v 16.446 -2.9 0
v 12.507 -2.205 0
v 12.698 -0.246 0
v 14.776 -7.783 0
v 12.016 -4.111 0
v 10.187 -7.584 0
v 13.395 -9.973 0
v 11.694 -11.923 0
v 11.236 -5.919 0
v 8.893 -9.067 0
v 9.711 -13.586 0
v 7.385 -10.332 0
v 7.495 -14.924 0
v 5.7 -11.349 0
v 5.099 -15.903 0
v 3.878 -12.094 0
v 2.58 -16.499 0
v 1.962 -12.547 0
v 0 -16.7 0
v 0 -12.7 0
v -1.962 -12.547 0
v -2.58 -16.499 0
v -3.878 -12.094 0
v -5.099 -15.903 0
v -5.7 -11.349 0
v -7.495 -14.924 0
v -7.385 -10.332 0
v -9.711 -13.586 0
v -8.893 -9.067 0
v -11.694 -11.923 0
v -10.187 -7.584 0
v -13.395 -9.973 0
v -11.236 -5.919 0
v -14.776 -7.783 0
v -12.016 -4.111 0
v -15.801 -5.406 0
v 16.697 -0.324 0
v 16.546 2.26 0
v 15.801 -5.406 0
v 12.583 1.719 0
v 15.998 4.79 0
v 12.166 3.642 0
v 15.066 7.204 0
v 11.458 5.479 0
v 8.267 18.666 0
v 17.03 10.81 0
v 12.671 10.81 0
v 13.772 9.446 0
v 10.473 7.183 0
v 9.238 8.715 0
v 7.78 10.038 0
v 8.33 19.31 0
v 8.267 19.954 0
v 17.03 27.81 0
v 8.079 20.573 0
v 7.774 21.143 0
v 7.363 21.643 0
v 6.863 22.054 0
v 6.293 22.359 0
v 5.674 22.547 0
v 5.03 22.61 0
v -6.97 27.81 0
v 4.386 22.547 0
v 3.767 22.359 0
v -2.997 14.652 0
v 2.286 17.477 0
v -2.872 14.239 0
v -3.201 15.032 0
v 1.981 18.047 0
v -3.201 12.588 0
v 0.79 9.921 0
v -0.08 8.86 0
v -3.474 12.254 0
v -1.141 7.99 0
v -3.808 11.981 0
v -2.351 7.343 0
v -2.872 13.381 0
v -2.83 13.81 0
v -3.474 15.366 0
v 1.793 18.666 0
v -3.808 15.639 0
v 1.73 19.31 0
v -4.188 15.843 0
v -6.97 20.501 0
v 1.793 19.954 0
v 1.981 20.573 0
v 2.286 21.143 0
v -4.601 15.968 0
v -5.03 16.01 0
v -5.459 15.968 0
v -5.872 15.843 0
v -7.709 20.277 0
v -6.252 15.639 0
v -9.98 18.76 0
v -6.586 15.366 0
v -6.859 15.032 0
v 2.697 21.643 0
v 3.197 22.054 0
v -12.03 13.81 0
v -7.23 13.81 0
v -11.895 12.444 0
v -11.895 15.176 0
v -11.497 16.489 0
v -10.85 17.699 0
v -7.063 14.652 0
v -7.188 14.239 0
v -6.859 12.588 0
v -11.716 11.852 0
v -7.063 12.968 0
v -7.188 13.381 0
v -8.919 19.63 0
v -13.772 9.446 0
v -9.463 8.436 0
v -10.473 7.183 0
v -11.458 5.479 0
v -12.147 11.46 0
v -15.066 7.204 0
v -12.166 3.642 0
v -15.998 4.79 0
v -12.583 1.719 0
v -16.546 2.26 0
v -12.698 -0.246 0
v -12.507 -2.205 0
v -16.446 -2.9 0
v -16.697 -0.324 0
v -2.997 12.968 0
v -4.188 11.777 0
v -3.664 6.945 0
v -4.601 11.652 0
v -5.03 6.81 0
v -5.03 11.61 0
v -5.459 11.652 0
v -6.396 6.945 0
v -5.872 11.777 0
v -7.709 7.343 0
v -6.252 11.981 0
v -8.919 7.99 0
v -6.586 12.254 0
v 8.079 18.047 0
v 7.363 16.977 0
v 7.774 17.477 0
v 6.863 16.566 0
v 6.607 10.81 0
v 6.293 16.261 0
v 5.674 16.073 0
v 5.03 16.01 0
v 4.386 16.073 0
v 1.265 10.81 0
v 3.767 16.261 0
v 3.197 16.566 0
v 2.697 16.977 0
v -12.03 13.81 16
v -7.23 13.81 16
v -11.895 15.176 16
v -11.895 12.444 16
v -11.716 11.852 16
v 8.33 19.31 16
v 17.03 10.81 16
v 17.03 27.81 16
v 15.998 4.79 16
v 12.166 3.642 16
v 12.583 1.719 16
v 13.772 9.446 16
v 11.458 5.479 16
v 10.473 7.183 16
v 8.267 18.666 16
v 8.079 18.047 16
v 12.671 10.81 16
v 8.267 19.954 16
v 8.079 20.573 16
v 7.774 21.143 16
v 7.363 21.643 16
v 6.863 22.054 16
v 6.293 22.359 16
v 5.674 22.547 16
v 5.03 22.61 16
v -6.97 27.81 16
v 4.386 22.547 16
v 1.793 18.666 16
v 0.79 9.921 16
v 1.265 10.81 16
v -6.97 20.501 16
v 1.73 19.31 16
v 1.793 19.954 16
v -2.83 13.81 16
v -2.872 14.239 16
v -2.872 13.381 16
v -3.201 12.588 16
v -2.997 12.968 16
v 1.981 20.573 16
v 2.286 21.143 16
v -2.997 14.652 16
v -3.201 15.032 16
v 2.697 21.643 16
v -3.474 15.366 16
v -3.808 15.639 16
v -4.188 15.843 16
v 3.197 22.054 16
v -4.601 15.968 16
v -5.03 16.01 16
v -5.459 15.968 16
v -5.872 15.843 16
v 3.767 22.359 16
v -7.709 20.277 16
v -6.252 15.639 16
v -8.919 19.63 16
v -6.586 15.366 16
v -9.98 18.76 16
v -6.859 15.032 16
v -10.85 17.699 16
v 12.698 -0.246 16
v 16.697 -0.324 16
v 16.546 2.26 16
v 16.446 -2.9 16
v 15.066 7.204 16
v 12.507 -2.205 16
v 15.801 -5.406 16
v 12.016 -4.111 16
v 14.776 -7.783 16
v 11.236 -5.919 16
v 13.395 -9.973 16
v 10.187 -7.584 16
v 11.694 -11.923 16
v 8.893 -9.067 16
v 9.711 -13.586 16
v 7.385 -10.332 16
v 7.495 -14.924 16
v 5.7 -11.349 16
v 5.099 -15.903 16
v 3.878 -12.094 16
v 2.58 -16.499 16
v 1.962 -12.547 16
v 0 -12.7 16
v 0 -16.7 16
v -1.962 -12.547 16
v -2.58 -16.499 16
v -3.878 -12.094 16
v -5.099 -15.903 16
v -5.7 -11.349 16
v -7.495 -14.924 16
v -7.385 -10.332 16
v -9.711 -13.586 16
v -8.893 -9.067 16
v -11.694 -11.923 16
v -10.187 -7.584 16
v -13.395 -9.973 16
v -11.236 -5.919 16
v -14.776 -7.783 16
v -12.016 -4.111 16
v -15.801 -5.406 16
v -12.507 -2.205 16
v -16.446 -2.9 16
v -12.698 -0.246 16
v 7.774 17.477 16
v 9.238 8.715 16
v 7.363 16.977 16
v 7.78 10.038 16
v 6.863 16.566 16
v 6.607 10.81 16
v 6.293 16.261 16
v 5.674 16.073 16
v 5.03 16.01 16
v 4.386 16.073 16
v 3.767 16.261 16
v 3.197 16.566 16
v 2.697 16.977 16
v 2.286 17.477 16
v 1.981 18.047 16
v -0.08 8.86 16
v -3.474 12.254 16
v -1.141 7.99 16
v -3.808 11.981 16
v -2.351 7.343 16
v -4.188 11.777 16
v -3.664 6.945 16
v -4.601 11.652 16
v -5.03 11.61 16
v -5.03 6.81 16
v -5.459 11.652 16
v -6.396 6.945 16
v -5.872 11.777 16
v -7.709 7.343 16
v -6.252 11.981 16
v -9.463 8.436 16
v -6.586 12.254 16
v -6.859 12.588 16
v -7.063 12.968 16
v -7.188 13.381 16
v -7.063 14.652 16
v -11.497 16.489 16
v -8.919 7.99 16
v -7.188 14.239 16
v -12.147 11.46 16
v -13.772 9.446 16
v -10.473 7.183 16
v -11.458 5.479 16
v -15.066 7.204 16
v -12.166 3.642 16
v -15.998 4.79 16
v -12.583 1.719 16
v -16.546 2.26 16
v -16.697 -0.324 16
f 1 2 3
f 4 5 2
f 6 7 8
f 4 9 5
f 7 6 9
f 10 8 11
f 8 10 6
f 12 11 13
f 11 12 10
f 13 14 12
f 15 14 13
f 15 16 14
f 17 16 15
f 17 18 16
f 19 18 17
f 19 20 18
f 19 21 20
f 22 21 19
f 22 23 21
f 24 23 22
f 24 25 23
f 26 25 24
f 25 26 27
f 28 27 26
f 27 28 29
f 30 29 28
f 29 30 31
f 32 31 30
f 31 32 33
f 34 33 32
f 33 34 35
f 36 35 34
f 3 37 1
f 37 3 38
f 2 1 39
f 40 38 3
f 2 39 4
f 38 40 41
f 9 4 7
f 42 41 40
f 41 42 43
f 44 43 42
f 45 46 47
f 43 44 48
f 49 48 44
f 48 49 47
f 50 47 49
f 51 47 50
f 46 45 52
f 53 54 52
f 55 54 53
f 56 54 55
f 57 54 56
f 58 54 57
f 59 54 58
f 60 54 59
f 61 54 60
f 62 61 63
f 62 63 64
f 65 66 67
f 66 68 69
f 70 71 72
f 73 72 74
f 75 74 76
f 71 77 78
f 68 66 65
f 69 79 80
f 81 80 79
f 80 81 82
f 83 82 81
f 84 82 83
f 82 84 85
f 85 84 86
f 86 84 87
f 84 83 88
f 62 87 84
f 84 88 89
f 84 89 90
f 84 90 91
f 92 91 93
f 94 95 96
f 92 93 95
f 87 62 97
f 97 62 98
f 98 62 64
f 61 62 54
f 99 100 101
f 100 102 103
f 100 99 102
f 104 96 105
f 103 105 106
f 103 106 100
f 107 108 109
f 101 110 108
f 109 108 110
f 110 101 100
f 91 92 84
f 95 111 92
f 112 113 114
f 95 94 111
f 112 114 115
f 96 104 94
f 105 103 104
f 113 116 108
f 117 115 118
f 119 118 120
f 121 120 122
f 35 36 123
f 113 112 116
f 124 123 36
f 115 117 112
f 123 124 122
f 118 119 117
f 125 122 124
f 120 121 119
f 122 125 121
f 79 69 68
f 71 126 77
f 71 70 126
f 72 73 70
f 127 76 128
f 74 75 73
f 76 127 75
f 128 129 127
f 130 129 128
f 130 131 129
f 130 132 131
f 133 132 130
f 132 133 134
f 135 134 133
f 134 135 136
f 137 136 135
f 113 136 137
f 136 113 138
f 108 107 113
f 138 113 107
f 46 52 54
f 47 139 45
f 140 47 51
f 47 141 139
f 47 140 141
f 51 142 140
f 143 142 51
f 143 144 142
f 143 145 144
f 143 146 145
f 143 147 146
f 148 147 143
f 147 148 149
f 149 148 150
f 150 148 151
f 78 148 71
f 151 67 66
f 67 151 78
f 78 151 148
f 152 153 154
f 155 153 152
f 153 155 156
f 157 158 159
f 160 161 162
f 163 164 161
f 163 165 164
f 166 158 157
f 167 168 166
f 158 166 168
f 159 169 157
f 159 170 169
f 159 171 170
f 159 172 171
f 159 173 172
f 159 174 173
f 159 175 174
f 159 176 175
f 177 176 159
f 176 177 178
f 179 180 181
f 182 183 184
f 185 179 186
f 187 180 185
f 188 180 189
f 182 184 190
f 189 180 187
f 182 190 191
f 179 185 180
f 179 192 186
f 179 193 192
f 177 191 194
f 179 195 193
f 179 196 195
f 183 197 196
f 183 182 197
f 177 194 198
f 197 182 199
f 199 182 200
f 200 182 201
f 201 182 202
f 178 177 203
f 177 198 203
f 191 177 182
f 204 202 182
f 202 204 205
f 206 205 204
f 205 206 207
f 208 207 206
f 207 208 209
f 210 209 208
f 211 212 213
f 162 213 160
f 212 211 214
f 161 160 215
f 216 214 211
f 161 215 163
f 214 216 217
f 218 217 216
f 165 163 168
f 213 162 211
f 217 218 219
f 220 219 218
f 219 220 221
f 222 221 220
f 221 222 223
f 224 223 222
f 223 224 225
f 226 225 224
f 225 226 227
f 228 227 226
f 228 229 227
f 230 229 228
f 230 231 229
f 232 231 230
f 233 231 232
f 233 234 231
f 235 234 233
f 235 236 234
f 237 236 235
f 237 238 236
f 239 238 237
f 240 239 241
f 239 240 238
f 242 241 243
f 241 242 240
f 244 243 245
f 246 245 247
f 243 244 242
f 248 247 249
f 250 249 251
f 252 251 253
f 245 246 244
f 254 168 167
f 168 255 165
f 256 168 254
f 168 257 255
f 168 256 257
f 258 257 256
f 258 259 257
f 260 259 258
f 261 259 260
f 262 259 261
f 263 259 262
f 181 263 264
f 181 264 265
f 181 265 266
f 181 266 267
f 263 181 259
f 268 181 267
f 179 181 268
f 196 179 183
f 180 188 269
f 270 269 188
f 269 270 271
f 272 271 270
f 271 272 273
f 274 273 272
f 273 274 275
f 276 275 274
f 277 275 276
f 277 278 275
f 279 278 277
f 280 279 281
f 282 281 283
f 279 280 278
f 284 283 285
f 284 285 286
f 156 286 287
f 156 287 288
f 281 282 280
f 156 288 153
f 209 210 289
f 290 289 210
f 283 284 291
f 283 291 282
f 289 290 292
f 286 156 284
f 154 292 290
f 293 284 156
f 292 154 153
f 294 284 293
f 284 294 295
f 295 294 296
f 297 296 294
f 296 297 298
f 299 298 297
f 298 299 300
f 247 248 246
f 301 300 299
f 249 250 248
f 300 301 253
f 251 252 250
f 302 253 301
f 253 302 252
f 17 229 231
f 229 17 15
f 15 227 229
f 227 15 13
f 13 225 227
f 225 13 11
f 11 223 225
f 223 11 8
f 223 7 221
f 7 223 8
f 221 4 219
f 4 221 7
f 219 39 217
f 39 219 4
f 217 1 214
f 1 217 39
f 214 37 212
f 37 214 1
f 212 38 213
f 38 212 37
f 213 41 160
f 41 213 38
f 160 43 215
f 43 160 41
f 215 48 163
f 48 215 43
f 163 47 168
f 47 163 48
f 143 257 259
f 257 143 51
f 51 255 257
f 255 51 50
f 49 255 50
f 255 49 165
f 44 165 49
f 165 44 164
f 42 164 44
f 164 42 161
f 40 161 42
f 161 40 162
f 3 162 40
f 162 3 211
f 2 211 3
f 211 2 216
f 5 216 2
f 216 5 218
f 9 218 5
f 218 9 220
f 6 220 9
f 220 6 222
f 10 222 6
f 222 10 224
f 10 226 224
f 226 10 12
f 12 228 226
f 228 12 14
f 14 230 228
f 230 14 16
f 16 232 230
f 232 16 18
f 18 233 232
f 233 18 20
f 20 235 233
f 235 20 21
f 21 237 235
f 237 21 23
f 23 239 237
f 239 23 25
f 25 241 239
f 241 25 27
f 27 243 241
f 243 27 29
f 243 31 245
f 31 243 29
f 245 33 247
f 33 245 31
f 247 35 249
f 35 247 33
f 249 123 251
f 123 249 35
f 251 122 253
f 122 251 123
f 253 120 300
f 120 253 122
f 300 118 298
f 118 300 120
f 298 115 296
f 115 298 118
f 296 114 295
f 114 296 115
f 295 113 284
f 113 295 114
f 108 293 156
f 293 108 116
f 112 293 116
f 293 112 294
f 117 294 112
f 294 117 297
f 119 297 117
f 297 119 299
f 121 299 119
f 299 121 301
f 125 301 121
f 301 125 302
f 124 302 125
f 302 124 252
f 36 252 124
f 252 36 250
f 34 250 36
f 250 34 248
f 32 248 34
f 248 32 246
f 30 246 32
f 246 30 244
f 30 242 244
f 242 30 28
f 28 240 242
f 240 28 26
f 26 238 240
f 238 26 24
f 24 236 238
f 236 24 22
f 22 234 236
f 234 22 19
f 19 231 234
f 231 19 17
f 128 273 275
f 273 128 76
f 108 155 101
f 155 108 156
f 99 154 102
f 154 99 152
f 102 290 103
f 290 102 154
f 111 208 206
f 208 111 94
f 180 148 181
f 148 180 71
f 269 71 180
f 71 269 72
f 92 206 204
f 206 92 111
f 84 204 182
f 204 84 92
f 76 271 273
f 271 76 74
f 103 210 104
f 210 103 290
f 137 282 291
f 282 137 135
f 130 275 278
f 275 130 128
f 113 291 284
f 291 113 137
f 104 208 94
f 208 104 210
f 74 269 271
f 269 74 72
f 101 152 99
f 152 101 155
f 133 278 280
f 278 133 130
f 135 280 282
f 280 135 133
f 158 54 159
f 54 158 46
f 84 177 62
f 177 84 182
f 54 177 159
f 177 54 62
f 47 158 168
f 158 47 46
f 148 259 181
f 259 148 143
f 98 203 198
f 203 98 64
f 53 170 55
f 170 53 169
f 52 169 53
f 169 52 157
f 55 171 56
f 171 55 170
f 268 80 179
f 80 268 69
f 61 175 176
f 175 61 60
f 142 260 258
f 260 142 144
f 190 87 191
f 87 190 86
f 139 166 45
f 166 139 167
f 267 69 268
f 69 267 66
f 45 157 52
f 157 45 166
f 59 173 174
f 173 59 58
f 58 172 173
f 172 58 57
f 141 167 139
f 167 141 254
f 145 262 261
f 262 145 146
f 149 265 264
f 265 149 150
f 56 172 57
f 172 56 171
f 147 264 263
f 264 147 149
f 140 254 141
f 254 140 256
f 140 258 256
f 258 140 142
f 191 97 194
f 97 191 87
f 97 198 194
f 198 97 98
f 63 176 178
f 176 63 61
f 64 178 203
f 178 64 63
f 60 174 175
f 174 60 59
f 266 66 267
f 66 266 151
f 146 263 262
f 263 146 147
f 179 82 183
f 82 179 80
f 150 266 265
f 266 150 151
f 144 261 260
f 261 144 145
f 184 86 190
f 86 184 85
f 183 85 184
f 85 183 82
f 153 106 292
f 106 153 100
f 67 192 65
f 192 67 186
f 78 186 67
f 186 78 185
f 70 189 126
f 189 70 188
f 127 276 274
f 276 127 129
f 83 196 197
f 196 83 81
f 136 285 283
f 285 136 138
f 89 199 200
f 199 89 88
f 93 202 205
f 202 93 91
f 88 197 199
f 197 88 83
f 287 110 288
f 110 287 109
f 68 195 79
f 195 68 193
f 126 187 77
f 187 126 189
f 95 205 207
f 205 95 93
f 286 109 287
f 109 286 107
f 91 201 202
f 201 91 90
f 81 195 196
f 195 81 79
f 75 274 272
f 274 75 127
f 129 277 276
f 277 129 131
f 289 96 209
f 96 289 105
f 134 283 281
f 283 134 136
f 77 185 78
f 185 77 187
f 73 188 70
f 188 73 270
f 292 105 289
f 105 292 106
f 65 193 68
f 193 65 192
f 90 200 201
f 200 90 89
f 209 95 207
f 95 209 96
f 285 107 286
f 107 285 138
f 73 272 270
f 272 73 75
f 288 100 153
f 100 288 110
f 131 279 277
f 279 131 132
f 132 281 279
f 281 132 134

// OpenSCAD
$fn = 32;

// ----------------------------------------------------------------------
// Pipe clamp: 33.4 mm ring, 4 mm wall, 16 mm wide
// ----------------------------------------------------------------------

// --- parameters (mm) ---
outer_r = 16.7;           // clamp outside radius
inner_r = 12.7;           // pipe bore radius
band = 4;                 // band thickness
clamp_w = 16;             // clamp width
opening = 40;             // opening angle between the ends
lug_w = 24;               // lug width
lug_len = 17;             // lug length
bolt_d = 6.6;             // bolt hole
knuckle_d = 14;           // hinge knuckle diameter
pin_d = 4.4;              // hinge pin hole

clamp_profile = [[-5.712, 15.693], [-8.068, 14.622], [-10.23, 13.2], [-12.147, 11.46], [-13.772, 9.446], [-15.066, 7.204], [-15.998, 4.79], [-16.546, 2.26], [-16.697, -0.324], [-16.446, -2.9], [-15.801, -5.406], [-14.776, -7.783], [-13.395, -9.973], [-11.694, -11.923], [-9.711, -13.586], [-7.495, -14.924], [-5.099, -15.903], [-2.58, -16.499], [0, -16.7], [2.58, -16.499], [5.099, -15.903], [7.495, -14.924], [9.711, -13.586], [11.694, -11.923], [13.395, -9.973], [14.776, -7.783], [15.801, -5.406], [16.446, -2.9], [16.697, -0.324], [16.546, 2.26], [15.998, 4.79], [15.066, 7.204], [13.772, 9.446], [12.147, 11.46], [10.23, 13.2], [8.068, 14.622], [5.712, 15.693], [4.344, 11.934], [6.136, 11.12], [7.78, 10.038], [9.238, 8.715], [10.473, 7.183], [11.458, 5.479], [12.166, 3.642], [12.583, 1.719], [12.698, -0.246], [12.507, -2.205], [12.016, -4.111], [11.236, -5.919], [10.187, -7.584], [8.893, -9.067], [7.385, -10.332], [5.7, -11.349], [3.878, -12.094], [1.962, -12.547], [0, -12.7], [-1.962, -12.547], [-3.878, -12.094], [-5.7, -11.349], [-7.385, -10.332], [-8.893, -9.067], [-10.187, -7.584], [-11.236, -5.919], [-12.016, -4.111], [-12.507, -2.205], [-12.698, -0.246], [-12.583, 1.719], [-12.166, 3.642], [-11.458, 5.479], [-10.473, 7.183], [-9.238, 8.715], [-7.78, 10.038], [-6.136, 11.12], [-4.344, 11.934]];

difference() {
  union() {
    linear_extrude(height = clamp_w) polygon(clamp_profile);
    /* hinge knuckle, sunk 2 mm into the band end */
    translate([-5.03, 13.81, 0]) cylinder(h = clamp_w, d = knuckle_d);
    /* bolt lug on the other end */
    translate([-6.97, 10.81, 0]) cube([lug_w, 17, clamp_w]);
  }
  translate([5.03, 19.31, -2.5]) cylinder(h = clamp_w + 5, d = bolt_d);
  translate([-5.03, 13.81, -2.5]) cylinder(h = clamp_w + 5, d = pin_d);
}
